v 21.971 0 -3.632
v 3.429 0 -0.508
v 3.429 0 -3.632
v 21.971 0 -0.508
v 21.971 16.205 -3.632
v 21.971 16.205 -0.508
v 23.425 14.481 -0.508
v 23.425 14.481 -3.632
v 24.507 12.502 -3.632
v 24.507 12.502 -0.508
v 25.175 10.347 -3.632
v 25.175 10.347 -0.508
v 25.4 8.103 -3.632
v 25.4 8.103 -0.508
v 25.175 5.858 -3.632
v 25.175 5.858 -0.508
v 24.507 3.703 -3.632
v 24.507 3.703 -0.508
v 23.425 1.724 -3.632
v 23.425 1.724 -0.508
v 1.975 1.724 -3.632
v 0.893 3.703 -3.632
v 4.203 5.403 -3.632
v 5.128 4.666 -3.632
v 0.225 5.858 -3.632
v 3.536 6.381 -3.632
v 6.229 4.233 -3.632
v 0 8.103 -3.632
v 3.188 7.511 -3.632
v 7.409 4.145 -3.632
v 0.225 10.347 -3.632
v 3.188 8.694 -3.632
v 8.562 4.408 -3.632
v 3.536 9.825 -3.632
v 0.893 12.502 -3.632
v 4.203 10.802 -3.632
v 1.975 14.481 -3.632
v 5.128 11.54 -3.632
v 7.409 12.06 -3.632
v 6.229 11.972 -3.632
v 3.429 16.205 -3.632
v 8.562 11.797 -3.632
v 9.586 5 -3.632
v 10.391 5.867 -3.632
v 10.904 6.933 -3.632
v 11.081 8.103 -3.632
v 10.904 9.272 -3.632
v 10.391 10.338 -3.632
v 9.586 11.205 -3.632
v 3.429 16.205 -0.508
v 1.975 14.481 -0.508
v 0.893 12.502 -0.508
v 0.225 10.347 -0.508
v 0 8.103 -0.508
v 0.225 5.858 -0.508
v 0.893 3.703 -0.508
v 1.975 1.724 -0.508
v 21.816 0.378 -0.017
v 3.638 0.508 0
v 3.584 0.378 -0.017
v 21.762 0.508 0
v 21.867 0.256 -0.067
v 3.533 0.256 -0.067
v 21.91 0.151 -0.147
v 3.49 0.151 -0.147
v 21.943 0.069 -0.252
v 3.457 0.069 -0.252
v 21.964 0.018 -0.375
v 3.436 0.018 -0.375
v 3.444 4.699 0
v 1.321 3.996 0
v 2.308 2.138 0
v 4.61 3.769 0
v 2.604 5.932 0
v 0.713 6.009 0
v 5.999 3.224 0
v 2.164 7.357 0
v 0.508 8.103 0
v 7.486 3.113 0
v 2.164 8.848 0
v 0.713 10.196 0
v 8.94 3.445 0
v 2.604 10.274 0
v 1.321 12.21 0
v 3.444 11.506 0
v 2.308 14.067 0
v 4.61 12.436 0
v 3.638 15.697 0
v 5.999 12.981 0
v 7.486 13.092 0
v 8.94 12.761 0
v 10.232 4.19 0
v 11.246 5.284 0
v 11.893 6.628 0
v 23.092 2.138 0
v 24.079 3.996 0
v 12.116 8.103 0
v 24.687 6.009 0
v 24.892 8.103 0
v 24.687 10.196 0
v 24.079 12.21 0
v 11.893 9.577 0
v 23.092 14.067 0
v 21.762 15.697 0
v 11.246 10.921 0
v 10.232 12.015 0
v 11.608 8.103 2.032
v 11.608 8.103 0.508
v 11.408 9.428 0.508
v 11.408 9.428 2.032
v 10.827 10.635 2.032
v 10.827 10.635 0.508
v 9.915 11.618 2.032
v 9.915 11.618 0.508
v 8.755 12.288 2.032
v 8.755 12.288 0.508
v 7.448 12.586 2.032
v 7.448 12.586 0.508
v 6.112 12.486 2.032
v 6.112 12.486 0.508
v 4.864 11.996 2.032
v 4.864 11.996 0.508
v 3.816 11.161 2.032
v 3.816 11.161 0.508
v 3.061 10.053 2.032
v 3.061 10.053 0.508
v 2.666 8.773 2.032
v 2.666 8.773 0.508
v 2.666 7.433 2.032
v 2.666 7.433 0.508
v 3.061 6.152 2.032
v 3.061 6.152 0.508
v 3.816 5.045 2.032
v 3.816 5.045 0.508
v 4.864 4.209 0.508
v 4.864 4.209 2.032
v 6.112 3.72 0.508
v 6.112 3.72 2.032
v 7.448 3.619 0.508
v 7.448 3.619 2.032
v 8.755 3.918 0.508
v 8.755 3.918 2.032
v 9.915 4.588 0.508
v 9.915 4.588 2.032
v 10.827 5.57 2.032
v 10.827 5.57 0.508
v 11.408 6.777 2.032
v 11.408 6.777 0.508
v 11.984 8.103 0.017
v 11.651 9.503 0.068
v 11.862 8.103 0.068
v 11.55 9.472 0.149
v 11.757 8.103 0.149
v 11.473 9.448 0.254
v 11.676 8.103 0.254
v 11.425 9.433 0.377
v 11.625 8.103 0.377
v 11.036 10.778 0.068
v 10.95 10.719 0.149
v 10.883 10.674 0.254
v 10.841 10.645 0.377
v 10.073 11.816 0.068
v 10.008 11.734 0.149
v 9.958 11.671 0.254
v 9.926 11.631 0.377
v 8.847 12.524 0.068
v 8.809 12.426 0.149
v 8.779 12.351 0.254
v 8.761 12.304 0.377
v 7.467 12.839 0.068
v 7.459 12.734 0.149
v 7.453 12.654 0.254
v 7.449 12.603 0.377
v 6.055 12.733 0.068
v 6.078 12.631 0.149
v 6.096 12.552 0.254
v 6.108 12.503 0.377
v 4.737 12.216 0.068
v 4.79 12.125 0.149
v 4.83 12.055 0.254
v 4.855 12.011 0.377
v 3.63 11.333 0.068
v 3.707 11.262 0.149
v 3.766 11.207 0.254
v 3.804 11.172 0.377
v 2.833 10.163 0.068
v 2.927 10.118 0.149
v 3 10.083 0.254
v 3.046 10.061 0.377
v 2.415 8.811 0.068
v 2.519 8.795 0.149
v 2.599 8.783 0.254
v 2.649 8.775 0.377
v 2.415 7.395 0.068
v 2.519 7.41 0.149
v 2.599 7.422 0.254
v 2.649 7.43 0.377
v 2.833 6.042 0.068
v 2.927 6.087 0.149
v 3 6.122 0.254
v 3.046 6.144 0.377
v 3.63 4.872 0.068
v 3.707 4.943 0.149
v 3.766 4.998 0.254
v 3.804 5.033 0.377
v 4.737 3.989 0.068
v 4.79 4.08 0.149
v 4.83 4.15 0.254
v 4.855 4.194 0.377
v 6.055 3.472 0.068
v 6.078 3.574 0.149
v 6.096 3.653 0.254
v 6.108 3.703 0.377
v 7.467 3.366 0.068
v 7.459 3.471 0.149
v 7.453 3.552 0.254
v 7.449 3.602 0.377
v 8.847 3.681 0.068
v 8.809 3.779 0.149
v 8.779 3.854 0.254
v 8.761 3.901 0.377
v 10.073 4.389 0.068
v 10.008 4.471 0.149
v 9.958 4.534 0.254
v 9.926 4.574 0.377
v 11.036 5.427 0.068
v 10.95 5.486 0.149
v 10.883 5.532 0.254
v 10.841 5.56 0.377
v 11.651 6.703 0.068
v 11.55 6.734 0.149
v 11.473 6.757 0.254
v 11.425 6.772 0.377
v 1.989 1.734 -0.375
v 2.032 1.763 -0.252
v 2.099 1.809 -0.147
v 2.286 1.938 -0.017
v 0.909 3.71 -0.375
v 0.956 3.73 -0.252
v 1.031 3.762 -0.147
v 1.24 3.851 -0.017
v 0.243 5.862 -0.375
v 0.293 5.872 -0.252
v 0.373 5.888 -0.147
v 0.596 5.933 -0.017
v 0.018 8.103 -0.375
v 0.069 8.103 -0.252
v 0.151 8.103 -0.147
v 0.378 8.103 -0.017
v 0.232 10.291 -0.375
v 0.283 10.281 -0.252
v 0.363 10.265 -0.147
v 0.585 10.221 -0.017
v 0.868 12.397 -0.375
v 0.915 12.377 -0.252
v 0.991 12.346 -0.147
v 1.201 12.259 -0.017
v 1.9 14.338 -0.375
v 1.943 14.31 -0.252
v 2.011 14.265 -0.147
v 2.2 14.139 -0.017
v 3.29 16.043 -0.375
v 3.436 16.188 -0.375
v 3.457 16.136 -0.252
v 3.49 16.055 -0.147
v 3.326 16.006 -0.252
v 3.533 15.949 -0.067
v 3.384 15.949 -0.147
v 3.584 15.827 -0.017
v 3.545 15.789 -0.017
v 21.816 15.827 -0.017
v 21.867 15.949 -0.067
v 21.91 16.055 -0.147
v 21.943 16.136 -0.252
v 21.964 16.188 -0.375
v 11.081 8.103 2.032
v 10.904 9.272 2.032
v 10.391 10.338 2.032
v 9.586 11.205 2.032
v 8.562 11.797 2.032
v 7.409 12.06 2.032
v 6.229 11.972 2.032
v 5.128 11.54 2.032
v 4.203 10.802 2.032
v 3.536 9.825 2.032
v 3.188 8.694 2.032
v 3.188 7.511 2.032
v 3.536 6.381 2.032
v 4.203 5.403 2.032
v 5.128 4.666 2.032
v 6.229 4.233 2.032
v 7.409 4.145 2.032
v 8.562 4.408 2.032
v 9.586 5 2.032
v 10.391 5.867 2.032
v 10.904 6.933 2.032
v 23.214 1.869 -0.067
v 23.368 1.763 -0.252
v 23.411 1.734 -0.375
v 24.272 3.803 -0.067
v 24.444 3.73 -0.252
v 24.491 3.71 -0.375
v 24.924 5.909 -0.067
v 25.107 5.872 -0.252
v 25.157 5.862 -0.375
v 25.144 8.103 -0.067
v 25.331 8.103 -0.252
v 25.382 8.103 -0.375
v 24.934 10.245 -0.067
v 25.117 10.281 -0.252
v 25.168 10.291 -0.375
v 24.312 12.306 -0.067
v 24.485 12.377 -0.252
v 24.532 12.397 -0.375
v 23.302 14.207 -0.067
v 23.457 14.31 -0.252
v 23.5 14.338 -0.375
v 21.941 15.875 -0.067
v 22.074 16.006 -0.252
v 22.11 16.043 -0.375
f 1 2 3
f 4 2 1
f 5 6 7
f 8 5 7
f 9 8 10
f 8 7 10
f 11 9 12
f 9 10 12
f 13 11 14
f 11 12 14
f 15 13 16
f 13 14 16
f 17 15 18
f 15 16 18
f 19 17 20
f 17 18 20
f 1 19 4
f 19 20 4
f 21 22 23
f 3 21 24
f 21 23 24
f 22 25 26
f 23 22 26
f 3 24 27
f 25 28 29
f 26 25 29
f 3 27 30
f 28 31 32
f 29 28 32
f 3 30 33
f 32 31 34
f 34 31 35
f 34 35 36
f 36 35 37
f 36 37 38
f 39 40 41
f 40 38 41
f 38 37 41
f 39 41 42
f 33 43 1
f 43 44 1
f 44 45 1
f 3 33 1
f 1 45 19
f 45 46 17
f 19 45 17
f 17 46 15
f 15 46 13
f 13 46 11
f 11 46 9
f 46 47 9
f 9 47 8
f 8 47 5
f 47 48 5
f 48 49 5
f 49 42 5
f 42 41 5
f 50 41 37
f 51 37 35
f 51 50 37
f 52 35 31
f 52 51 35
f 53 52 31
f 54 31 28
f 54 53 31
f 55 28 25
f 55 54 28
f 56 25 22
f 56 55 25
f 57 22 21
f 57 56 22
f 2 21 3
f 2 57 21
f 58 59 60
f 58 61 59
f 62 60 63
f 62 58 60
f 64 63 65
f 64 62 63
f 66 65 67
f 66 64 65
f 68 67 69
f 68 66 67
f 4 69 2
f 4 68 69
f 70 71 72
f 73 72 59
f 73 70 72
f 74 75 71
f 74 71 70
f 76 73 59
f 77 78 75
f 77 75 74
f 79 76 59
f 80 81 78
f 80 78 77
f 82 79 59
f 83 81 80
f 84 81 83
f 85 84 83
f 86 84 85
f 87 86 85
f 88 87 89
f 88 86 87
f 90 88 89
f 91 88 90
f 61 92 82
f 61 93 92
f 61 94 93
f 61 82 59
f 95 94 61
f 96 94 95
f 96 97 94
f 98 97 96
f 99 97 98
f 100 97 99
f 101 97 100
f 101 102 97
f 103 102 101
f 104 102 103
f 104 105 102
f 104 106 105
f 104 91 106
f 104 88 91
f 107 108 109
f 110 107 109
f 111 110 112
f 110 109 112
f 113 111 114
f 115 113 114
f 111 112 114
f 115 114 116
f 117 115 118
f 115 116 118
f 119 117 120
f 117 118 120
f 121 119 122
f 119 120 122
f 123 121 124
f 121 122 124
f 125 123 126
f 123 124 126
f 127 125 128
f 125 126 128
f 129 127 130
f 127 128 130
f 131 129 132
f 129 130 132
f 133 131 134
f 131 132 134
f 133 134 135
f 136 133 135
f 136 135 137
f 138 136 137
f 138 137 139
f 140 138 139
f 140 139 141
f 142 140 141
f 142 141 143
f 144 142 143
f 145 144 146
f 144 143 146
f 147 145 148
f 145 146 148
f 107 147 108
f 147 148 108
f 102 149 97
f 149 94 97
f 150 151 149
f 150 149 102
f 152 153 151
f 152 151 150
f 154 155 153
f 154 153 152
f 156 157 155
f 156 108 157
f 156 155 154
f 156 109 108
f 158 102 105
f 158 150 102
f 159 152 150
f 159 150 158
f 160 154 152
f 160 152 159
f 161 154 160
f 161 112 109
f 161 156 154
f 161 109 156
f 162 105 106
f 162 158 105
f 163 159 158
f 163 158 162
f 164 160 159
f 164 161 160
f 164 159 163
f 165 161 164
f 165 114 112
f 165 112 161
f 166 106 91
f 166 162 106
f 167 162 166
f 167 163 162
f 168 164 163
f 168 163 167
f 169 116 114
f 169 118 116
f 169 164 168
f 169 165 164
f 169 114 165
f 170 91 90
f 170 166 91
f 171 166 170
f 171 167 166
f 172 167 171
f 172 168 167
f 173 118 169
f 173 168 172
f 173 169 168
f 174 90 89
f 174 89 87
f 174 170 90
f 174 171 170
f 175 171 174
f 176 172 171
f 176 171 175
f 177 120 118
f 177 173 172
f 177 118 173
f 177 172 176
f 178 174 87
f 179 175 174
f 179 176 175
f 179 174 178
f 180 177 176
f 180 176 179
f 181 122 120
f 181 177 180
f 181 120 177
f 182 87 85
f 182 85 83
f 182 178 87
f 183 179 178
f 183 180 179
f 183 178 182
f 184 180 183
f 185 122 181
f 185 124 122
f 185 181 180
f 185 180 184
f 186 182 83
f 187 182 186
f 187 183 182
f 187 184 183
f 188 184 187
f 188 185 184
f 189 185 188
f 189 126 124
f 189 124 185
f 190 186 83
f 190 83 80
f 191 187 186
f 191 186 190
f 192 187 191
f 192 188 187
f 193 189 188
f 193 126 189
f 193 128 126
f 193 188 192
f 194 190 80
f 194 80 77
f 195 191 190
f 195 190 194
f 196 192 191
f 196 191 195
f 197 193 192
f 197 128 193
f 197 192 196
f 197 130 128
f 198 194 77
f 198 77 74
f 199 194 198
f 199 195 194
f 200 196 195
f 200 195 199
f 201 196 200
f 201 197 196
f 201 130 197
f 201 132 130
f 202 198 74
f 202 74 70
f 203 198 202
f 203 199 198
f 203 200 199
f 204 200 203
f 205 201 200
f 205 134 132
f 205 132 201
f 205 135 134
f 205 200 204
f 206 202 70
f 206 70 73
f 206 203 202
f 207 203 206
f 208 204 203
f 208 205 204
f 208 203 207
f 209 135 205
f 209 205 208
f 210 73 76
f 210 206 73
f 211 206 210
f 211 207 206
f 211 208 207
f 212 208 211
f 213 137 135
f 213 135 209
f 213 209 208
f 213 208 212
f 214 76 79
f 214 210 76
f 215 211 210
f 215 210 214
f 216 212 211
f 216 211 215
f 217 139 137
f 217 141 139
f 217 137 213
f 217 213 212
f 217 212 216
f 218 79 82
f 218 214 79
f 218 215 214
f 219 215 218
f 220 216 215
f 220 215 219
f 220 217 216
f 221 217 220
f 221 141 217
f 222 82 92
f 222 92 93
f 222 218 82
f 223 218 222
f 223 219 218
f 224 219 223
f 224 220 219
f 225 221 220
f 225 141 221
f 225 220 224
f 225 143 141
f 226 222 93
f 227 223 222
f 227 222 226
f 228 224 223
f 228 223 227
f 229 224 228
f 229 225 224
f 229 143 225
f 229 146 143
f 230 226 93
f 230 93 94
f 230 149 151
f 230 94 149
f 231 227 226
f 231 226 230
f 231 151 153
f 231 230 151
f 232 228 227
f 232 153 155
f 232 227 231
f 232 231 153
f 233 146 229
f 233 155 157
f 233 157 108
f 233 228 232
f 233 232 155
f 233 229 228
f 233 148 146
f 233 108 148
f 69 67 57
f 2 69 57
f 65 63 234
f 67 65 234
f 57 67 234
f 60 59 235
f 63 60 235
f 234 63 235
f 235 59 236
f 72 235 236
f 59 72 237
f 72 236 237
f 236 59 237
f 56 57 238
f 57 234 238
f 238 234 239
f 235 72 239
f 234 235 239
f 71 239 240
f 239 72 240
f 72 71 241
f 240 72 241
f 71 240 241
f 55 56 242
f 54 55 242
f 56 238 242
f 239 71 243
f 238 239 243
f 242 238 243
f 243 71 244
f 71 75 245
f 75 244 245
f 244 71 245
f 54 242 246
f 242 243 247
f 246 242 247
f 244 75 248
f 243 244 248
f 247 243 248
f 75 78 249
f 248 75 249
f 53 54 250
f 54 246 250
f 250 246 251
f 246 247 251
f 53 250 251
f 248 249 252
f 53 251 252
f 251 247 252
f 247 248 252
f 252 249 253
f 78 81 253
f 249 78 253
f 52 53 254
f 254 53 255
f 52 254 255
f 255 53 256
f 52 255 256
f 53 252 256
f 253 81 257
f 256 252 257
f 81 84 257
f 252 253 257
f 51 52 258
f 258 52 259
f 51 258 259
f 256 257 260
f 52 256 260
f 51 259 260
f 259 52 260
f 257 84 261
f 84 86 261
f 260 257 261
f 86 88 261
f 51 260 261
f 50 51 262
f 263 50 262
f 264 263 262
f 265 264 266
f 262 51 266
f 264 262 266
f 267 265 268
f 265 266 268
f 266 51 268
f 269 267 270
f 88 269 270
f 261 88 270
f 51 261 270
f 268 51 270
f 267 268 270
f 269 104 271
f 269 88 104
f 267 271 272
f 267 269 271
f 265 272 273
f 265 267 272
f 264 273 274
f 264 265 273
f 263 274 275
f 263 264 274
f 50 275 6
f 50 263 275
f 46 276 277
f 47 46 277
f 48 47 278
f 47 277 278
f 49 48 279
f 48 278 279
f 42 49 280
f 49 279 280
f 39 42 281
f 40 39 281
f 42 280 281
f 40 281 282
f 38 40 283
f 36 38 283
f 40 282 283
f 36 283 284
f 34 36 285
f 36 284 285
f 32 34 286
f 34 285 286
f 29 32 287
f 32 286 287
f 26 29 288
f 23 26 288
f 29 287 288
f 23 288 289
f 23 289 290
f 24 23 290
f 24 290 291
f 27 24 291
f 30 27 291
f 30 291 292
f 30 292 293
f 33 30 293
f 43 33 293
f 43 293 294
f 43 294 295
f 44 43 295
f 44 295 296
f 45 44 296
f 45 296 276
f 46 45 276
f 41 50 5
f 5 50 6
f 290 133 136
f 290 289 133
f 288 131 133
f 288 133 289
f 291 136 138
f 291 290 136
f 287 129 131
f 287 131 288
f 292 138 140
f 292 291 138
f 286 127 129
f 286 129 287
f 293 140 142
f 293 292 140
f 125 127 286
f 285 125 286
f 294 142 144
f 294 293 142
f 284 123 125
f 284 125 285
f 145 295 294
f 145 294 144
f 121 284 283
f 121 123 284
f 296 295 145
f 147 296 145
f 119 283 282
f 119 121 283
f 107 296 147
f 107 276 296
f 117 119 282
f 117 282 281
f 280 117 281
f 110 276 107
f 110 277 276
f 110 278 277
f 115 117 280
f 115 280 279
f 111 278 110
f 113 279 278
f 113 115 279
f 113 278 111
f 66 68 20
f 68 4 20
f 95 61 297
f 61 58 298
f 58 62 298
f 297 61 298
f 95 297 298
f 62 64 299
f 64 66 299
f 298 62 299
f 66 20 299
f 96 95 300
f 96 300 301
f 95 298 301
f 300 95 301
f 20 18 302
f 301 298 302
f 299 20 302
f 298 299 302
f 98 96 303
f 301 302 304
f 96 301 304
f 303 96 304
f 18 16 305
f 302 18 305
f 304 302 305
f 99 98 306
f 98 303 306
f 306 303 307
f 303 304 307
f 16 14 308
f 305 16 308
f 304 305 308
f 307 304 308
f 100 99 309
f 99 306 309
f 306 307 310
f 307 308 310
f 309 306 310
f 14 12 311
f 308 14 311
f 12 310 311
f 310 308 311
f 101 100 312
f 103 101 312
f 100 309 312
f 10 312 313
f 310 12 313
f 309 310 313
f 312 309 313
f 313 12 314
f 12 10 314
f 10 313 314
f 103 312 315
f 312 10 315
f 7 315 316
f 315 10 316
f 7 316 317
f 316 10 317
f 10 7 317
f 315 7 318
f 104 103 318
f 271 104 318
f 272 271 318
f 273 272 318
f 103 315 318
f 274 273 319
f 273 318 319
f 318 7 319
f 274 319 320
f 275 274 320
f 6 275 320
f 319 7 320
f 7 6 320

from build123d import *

# Parameters (mm, degrees)
SKETCH1_W                          = 25.4
SKETCH1_H                          = 16.2052
BASE_EXTRUDE_DEPTH                 = 3.6322
SKETCH2_R                          = 4.4958
BOSS_EXTRUDE1_DEPTH                = 2.032
F_5_16_18_TAPPED_HOLE1_D           = 6.5278
F_5_16_18_TAPPED_HOLE1_CBORE_D     = 7.9375
F_5_16_18_TAPPED_HOLE1_CBORE_DEPTH = 15.875
CUT_EXTRUDE1_DEPTH                 = 3.032
CUT_EXTRUDE1_DEPTH_BACK            = 4.6322
CUT_EXTRUDE2_DEPTH                 = 3.032
CUT_EXTRUDE2_DEPTH_BACK            = 4.6322
FILLET1_R                          = 0.508


with BuildPart() as part:
    # Sketch1 → Base-Extrude (new body)
    with BuildSketch(Plane.XY):
        with Locations((12.7, 8.1026)):
            Rectangle(SKETCH1_W, SKETCH1_H)
    extrude(amount=-BASE_EXTRUDE_DEPTH)

    # Sketch2 → Boss-Extrude1 (add)
    with BuildSketch(Plane.XY):
        with Locations((7.112, 8.1026)):
            Circle(SKETCH2_R)
    extrude(amount=BOSS_EXTRUDE1_DEPTH)

    # 5/16-18 Tapped Hole1 (through all)
    with Locations(Plane(origin=(7.112, 8.1026, 2.032), x_dir=(1, 0, 0), z_dir=(0, 0, 1))):
        with Locations((0, 0)):
            CounterBoreHole(F_5_16_18_TAPPED_HOLE1_D / 2, F_5_16_18_TAPPED_HOLE1_CBORE_D / 2, F_5_16_18_TAPPED_HOLE1_CBORE_DEPTH)

    # Sketch4 → Cut-Extrude1 (cut, two sides)
    with BuildSketch(Plane.XY) as cut_extrude1_sk:
        with BuildLine():
            Line((-24.402199862, 61.181765932), (21.971, 16.2052))
            ThreePointArc((21.971, 16.2052), (25.4, 8.1026), (21.971, 0))
            Line((21.971, 0), (-24.402199862, -44.976565932))
            Line((-24.402199862, -44.976565932), (104.800975772, -44.976565932))
            Line((104.800975772, -44.976565932), (104.800975772, 61.181765932))
            Line((104.800975772, 61.181765932), (-24.402199862, 61.181765932))
        make_face()
    extrude(amount=CUT_EXTRUDE1_DEPTH, mode=Mode.SUBTRACT)
    extrude(cut_extrude1_sk.sketch, amount=-CUT_EXTRUDE1_DEPTH_BACK, mode=Mode.SUBTRACT)

    # Sketch6 → Cut-Extrude2 (cut, two sides)
    with BuildSketch(Plane.XY) as cut_extrude2_sk:
        with BuildLine():
            Line((49.802199862, 61.181765932), (3.429, 16.2052))
            ThreePointArc((3.429, 16.2052), (0, 8.1026), (3.429, 0))
            Line((3.429, 0), (49.802199862, -44.976565932))
            Line((49.802199862, -44.976565932), (-79.400975772, -44.976565932))
            Line((-79.400975772, -44.976565932), (-79.400975772, 61.181765932))
            Line((-79.400975772, 61.181765932), (49.802199862, 61.181765932))
        make_face()
    extrude(amount=CUT_EXTRUDE2_DEPTH, mode=Mode.SUBTRACT)
    extrude(cut_extrude2_sk.sketch, amount=-CUT_EXTRUDE2_DEPTH_BACK, mode=Mode.SUBTRACT)

    # Fillet1
    fillet1_edges = [part.edges().sort_by_distance(p)[0] for p in [
        (12.7, 0, 0),
        (0, 8.1026, 0),
        (12.7, 16.2052, 0),
        (2.6162, 8.1026, 0),
        (25.4, 8.1026, 0),
    ]]
    fillet(fillet1_edges, radius=FILLET1_R)


solid = part.part
